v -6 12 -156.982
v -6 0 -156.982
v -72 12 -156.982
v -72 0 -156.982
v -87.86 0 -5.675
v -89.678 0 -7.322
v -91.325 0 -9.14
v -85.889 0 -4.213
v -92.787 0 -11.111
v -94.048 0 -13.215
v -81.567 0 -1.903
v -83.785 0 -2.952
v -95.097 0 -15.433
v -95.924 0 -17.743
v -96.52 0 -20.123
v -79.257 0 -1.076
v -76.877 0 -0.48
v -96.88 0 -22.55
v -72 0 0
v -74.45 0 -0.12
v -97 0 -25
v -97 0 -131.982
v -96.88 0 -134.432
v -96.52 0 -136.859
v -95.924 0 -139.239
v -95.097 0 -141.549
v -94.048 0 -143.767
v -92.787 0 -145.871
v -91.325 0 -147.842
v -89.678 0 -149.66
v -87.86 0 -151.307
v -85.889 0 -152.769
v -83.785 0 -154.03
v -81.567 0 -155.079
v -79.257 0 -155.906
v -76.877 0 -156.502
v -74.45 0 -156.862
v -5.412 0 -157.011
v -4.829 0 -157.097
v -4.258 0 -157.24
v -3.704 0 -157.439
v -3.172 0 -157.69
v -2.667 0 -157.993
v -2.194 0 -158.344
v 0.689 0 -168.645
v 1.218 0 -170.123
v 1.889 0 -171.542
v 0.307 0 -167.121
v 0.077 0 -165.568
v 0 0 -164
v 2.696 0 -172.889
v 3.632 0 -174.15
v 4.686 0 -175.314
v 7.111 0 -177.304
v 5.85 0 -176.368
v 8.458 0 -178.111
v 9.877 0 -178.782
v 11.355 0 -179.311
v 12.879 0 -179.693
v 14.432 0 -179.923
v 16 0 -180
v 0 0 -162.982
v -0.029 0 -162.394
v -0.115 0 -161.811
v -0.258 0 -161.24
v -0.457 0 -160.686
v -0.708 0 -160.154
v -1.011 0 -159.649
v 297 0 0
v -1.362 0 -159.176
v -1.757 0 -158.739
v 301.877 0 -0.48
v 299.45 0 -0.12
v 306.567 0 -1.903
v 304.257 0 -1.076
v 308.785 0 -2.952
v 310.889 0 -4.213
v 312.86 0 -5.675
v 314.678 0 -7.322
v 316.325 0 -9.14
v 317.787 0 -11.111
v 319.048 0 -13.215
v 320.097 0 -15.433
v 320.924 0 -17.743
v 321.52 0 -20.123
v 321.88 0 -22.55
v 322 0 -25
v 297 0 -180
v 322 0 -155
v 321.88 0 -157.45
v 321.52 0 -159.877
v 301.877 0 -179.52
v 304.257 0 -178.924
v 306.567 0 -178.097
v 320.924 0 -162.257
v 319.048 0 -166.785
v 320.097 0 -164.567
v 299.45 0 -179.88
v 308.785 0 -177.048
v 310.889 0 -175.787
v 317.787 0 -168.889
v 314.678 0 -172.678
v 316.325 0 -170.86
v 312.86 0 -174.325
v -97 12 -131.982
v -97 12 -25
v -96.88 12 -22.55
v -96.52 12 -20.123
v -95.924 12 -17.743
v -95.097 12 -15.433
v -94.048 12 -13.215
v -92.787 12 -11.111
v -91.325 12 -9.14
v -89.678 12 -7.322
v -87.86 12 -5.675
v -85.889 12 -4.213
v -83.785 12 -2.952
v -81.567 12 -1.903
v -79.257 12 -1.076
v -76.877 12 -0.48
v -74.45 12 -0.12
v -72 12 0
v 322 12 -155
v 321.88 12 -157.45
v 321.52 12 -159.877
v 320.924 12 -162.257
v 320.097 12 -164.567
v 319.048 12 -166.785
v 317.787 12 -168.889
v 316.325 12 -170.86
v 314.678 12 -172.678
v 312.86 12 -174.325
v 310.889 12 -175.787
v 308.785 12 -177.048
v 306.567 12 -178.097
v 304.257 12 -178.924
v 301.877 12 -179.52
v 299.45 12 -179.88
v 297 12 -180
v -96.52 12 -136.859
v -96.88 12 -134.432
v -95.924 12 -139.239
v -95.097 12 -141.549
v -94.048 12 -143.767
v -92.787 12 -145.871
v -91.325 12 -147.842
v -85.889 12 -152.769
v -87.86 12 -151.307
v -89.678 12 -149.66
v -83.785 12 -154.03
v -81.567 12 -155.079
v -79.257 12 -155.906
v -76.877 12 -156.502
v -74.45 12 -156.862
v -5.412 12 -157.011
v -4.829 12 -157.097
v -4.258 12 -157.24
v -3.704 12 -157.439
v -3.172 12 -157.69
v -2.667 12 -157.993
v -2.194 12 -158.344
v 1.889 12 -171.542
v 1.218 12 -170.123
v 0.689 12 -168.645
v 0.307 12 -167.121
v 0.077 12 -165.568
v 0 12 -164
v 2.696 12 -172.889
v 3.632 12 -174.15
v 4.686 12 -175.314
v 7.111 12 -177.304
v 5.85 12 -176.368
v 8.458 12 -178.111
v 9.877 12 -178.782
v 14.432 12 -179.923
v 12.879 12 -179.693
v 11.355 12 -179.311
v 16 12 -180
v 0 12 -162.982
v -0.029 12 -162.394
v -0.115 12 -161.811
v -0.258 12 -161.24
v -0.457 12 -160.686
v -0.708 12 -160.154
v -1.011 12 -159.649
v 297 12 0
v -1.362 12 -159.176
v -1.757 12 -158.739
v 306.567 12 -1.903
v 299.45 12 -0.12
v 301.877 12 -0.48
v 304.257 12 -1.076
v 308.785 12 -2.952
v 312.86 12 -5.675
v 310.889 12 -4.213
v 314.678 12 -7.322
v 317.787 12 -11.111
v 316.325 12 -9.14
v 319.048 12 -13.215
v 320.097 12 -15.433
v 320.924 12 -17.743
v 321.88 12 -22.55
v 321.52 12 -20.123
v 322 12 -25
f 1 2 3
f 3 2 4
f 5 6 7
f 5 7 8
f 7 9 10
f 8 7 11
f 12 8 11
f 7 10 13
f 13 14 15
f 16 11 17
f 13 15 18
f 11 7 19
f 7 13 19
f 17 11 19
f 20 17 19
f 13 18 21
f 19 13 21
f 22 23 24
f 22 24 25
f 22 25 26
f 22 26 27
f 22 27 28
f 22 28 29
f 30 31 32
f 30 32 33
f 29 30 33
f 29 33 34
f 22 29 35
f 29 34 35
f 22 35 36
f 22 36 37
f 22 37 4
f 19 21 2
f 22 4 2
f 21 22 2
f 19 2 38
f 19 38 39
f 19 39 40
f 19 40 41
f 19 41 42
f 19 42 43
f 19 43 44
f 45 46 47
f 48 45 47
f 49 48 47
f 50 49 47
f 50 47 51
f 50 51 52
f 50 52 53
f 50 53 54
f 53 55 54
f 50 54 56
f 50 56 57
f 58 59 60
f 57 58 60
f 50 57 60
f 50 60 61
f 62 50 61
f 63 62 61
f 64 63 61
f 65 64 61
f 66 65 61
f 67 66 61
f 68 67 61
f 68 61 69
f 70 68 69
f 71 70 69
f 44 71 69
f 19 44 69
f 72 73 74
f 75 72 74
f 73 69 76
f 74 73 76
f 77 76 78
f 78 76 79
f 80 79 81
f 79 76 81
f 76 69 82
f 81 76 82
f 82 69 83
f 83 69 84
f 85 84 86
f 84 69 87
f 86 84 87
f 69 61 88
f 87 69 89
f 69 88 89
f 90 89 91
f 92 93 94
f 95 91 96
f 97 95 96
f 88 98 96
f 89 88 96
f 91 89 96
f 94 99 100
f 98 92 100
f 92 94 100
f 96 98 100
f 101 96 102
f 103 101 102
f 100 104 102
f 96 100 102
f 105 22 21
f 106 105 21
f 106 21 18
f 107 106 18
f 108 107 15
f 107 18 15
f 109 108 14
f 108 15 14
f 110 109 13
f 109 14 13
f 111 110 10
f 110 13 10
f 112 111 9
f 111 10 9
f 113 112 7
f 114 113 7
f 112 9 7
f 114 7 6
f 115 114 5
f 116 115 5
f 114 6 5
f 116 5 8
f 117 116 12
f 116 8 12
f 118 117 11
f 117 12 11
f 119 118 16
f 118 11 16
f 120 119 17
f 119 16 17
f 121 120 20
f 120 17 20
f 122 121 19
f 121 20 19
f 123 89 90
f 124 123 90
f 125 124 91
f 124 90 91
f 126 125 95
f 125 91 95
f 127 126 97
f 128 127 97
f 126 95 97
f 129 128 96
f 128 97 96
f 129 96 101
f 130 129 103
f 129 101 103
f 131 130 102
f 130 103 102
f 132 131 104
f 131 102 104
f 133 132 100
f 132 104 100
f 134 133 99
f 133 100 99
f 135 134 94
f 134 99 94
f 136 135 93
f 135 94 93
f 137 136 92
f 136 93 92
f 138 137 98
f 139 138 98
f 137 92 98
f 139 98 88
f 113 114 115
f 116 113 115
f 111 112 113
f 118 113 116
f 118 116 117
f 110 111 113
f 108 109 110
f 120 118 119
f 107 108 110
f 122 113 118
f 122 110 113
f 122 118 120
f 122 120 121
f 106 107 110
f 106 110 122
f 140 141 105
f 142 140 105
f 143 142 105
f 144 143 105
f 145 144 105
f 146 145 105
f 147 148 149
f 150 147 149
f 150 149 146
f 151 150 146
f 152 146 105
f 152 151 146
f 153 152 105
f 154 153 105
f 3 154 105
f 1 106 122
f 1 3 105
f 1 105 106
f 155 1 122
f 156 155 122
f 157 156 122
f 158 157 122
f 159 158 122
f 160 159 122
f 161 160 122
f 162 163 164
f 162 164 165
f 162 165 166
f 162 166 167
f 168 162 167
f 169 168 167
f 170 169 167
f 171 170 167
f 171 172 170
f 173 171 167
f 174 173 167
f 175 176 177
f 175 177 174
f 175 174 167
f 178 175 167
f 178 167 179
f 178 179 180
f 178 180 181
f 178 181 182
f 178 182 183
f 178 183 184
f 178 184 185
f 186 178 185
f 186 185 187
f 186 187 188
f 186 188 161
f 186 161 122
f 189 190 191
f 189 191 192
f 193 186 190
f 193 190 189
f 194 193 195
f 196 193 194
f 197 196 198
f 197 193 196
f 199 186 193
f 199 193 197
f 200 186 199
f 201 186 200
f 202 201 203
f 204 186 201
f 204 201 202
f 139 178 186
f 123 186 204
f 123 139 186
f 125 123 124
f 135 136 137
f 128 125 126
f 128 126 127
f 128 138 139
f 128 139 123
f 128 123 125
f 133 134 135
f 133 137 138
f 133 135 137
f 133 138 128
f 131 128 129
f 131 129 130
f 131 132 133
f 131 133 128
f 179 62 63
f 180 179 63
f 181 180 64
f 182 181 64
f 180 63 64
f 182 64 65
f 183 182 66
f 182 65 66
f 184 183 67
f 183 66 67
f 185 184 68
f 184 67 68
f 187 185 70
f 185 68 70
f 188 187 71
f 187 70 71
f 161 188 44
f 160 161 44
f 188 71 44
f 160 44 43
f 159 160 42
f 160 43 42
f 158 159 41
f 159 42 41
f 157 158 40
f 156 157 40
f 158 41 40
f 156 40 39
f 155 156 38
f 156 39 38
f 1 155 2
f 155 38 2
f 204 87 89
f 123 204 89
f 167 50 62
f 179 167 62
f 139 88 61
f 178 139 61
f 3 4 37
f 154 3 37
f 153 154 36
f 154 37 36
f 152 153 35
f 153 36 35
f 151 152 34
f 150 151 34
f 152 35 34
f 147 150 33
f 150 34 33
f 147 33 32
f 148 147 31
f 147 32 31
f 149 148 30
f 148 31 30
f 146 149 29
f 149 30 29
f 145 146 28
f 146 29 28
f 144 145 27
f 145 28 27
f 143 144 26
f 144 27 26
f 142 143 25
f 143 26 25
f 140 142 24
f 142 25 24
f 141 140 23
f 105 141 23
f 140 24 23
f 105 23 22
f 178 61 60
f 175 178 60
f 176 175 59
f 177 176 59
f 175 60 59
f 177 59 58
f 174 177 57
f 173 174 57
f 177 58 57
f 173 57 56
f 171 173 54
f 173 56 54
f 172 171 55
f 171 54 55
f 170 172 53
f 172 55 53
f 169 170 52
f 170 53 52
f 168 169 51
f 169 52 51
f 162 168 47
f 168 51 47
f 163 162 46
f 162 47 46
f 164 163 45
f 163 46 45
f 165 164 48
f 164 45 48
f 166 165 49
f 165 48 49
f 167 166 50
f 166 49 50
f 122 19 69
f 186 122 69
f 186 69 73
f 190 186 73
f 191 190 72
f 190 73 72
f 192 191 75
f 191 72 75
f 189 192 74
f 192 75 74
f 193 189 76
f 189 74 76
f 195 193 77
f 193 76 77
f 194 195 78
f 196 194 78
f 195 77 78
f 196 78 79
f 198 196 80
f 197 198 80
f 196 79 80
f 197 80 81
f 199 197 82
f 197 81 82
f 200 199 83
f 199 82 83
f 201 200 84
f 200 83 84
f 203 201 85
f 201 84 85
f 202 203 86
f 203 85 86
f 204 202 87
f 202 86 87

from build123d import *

# Parameters (mm, degrees)
EXTRUDE_1_DEPTH = 12


with BuildPart() as part:
    # Эскиз1 → Бобышка-Вытянуть1 (new body)
    with BuildSketch(Plane(origin=(0, 0, 0), x_dir=(1, 0, 0), z_dir=(0, 1, 0))):
        with BuildLine():
            Line((0, 0), (297, 0))
            ThreePointArc((297, 0), (314.67766953, 7.32233047), (322, 25))
            Line((322, 25), (322, 155))
            ThreePointArc((322, 155), (314.67766953, 172.67766953), (297, 180))
            Line((297, 180), (16, 180))
            ThreePointArc((16, 180), (4.686291501, 175.313708499), (0, 164))
            Line((0, 164), (0, 162.982))
            ThreePointArc((0, 162.982), (-1.757359313, 158.739359313), (-6, 156.982))
            Line((-6, 156.982), (-72, 156.982))
            ThreePointArc((-72, 156.982), (-89.67766953, 149.65966953), (-97, 131.982))
            Line((-97, 131.982), (-97, 25))
            ThreePointArc((-97, 25), (-89.67766953, 7.32233047), (-72, 0))
            Line((-72, 0), (0, 0))
        make_face()
    extrude(amount=EXTRUDE_1_DEPTH)


solid = part.part
